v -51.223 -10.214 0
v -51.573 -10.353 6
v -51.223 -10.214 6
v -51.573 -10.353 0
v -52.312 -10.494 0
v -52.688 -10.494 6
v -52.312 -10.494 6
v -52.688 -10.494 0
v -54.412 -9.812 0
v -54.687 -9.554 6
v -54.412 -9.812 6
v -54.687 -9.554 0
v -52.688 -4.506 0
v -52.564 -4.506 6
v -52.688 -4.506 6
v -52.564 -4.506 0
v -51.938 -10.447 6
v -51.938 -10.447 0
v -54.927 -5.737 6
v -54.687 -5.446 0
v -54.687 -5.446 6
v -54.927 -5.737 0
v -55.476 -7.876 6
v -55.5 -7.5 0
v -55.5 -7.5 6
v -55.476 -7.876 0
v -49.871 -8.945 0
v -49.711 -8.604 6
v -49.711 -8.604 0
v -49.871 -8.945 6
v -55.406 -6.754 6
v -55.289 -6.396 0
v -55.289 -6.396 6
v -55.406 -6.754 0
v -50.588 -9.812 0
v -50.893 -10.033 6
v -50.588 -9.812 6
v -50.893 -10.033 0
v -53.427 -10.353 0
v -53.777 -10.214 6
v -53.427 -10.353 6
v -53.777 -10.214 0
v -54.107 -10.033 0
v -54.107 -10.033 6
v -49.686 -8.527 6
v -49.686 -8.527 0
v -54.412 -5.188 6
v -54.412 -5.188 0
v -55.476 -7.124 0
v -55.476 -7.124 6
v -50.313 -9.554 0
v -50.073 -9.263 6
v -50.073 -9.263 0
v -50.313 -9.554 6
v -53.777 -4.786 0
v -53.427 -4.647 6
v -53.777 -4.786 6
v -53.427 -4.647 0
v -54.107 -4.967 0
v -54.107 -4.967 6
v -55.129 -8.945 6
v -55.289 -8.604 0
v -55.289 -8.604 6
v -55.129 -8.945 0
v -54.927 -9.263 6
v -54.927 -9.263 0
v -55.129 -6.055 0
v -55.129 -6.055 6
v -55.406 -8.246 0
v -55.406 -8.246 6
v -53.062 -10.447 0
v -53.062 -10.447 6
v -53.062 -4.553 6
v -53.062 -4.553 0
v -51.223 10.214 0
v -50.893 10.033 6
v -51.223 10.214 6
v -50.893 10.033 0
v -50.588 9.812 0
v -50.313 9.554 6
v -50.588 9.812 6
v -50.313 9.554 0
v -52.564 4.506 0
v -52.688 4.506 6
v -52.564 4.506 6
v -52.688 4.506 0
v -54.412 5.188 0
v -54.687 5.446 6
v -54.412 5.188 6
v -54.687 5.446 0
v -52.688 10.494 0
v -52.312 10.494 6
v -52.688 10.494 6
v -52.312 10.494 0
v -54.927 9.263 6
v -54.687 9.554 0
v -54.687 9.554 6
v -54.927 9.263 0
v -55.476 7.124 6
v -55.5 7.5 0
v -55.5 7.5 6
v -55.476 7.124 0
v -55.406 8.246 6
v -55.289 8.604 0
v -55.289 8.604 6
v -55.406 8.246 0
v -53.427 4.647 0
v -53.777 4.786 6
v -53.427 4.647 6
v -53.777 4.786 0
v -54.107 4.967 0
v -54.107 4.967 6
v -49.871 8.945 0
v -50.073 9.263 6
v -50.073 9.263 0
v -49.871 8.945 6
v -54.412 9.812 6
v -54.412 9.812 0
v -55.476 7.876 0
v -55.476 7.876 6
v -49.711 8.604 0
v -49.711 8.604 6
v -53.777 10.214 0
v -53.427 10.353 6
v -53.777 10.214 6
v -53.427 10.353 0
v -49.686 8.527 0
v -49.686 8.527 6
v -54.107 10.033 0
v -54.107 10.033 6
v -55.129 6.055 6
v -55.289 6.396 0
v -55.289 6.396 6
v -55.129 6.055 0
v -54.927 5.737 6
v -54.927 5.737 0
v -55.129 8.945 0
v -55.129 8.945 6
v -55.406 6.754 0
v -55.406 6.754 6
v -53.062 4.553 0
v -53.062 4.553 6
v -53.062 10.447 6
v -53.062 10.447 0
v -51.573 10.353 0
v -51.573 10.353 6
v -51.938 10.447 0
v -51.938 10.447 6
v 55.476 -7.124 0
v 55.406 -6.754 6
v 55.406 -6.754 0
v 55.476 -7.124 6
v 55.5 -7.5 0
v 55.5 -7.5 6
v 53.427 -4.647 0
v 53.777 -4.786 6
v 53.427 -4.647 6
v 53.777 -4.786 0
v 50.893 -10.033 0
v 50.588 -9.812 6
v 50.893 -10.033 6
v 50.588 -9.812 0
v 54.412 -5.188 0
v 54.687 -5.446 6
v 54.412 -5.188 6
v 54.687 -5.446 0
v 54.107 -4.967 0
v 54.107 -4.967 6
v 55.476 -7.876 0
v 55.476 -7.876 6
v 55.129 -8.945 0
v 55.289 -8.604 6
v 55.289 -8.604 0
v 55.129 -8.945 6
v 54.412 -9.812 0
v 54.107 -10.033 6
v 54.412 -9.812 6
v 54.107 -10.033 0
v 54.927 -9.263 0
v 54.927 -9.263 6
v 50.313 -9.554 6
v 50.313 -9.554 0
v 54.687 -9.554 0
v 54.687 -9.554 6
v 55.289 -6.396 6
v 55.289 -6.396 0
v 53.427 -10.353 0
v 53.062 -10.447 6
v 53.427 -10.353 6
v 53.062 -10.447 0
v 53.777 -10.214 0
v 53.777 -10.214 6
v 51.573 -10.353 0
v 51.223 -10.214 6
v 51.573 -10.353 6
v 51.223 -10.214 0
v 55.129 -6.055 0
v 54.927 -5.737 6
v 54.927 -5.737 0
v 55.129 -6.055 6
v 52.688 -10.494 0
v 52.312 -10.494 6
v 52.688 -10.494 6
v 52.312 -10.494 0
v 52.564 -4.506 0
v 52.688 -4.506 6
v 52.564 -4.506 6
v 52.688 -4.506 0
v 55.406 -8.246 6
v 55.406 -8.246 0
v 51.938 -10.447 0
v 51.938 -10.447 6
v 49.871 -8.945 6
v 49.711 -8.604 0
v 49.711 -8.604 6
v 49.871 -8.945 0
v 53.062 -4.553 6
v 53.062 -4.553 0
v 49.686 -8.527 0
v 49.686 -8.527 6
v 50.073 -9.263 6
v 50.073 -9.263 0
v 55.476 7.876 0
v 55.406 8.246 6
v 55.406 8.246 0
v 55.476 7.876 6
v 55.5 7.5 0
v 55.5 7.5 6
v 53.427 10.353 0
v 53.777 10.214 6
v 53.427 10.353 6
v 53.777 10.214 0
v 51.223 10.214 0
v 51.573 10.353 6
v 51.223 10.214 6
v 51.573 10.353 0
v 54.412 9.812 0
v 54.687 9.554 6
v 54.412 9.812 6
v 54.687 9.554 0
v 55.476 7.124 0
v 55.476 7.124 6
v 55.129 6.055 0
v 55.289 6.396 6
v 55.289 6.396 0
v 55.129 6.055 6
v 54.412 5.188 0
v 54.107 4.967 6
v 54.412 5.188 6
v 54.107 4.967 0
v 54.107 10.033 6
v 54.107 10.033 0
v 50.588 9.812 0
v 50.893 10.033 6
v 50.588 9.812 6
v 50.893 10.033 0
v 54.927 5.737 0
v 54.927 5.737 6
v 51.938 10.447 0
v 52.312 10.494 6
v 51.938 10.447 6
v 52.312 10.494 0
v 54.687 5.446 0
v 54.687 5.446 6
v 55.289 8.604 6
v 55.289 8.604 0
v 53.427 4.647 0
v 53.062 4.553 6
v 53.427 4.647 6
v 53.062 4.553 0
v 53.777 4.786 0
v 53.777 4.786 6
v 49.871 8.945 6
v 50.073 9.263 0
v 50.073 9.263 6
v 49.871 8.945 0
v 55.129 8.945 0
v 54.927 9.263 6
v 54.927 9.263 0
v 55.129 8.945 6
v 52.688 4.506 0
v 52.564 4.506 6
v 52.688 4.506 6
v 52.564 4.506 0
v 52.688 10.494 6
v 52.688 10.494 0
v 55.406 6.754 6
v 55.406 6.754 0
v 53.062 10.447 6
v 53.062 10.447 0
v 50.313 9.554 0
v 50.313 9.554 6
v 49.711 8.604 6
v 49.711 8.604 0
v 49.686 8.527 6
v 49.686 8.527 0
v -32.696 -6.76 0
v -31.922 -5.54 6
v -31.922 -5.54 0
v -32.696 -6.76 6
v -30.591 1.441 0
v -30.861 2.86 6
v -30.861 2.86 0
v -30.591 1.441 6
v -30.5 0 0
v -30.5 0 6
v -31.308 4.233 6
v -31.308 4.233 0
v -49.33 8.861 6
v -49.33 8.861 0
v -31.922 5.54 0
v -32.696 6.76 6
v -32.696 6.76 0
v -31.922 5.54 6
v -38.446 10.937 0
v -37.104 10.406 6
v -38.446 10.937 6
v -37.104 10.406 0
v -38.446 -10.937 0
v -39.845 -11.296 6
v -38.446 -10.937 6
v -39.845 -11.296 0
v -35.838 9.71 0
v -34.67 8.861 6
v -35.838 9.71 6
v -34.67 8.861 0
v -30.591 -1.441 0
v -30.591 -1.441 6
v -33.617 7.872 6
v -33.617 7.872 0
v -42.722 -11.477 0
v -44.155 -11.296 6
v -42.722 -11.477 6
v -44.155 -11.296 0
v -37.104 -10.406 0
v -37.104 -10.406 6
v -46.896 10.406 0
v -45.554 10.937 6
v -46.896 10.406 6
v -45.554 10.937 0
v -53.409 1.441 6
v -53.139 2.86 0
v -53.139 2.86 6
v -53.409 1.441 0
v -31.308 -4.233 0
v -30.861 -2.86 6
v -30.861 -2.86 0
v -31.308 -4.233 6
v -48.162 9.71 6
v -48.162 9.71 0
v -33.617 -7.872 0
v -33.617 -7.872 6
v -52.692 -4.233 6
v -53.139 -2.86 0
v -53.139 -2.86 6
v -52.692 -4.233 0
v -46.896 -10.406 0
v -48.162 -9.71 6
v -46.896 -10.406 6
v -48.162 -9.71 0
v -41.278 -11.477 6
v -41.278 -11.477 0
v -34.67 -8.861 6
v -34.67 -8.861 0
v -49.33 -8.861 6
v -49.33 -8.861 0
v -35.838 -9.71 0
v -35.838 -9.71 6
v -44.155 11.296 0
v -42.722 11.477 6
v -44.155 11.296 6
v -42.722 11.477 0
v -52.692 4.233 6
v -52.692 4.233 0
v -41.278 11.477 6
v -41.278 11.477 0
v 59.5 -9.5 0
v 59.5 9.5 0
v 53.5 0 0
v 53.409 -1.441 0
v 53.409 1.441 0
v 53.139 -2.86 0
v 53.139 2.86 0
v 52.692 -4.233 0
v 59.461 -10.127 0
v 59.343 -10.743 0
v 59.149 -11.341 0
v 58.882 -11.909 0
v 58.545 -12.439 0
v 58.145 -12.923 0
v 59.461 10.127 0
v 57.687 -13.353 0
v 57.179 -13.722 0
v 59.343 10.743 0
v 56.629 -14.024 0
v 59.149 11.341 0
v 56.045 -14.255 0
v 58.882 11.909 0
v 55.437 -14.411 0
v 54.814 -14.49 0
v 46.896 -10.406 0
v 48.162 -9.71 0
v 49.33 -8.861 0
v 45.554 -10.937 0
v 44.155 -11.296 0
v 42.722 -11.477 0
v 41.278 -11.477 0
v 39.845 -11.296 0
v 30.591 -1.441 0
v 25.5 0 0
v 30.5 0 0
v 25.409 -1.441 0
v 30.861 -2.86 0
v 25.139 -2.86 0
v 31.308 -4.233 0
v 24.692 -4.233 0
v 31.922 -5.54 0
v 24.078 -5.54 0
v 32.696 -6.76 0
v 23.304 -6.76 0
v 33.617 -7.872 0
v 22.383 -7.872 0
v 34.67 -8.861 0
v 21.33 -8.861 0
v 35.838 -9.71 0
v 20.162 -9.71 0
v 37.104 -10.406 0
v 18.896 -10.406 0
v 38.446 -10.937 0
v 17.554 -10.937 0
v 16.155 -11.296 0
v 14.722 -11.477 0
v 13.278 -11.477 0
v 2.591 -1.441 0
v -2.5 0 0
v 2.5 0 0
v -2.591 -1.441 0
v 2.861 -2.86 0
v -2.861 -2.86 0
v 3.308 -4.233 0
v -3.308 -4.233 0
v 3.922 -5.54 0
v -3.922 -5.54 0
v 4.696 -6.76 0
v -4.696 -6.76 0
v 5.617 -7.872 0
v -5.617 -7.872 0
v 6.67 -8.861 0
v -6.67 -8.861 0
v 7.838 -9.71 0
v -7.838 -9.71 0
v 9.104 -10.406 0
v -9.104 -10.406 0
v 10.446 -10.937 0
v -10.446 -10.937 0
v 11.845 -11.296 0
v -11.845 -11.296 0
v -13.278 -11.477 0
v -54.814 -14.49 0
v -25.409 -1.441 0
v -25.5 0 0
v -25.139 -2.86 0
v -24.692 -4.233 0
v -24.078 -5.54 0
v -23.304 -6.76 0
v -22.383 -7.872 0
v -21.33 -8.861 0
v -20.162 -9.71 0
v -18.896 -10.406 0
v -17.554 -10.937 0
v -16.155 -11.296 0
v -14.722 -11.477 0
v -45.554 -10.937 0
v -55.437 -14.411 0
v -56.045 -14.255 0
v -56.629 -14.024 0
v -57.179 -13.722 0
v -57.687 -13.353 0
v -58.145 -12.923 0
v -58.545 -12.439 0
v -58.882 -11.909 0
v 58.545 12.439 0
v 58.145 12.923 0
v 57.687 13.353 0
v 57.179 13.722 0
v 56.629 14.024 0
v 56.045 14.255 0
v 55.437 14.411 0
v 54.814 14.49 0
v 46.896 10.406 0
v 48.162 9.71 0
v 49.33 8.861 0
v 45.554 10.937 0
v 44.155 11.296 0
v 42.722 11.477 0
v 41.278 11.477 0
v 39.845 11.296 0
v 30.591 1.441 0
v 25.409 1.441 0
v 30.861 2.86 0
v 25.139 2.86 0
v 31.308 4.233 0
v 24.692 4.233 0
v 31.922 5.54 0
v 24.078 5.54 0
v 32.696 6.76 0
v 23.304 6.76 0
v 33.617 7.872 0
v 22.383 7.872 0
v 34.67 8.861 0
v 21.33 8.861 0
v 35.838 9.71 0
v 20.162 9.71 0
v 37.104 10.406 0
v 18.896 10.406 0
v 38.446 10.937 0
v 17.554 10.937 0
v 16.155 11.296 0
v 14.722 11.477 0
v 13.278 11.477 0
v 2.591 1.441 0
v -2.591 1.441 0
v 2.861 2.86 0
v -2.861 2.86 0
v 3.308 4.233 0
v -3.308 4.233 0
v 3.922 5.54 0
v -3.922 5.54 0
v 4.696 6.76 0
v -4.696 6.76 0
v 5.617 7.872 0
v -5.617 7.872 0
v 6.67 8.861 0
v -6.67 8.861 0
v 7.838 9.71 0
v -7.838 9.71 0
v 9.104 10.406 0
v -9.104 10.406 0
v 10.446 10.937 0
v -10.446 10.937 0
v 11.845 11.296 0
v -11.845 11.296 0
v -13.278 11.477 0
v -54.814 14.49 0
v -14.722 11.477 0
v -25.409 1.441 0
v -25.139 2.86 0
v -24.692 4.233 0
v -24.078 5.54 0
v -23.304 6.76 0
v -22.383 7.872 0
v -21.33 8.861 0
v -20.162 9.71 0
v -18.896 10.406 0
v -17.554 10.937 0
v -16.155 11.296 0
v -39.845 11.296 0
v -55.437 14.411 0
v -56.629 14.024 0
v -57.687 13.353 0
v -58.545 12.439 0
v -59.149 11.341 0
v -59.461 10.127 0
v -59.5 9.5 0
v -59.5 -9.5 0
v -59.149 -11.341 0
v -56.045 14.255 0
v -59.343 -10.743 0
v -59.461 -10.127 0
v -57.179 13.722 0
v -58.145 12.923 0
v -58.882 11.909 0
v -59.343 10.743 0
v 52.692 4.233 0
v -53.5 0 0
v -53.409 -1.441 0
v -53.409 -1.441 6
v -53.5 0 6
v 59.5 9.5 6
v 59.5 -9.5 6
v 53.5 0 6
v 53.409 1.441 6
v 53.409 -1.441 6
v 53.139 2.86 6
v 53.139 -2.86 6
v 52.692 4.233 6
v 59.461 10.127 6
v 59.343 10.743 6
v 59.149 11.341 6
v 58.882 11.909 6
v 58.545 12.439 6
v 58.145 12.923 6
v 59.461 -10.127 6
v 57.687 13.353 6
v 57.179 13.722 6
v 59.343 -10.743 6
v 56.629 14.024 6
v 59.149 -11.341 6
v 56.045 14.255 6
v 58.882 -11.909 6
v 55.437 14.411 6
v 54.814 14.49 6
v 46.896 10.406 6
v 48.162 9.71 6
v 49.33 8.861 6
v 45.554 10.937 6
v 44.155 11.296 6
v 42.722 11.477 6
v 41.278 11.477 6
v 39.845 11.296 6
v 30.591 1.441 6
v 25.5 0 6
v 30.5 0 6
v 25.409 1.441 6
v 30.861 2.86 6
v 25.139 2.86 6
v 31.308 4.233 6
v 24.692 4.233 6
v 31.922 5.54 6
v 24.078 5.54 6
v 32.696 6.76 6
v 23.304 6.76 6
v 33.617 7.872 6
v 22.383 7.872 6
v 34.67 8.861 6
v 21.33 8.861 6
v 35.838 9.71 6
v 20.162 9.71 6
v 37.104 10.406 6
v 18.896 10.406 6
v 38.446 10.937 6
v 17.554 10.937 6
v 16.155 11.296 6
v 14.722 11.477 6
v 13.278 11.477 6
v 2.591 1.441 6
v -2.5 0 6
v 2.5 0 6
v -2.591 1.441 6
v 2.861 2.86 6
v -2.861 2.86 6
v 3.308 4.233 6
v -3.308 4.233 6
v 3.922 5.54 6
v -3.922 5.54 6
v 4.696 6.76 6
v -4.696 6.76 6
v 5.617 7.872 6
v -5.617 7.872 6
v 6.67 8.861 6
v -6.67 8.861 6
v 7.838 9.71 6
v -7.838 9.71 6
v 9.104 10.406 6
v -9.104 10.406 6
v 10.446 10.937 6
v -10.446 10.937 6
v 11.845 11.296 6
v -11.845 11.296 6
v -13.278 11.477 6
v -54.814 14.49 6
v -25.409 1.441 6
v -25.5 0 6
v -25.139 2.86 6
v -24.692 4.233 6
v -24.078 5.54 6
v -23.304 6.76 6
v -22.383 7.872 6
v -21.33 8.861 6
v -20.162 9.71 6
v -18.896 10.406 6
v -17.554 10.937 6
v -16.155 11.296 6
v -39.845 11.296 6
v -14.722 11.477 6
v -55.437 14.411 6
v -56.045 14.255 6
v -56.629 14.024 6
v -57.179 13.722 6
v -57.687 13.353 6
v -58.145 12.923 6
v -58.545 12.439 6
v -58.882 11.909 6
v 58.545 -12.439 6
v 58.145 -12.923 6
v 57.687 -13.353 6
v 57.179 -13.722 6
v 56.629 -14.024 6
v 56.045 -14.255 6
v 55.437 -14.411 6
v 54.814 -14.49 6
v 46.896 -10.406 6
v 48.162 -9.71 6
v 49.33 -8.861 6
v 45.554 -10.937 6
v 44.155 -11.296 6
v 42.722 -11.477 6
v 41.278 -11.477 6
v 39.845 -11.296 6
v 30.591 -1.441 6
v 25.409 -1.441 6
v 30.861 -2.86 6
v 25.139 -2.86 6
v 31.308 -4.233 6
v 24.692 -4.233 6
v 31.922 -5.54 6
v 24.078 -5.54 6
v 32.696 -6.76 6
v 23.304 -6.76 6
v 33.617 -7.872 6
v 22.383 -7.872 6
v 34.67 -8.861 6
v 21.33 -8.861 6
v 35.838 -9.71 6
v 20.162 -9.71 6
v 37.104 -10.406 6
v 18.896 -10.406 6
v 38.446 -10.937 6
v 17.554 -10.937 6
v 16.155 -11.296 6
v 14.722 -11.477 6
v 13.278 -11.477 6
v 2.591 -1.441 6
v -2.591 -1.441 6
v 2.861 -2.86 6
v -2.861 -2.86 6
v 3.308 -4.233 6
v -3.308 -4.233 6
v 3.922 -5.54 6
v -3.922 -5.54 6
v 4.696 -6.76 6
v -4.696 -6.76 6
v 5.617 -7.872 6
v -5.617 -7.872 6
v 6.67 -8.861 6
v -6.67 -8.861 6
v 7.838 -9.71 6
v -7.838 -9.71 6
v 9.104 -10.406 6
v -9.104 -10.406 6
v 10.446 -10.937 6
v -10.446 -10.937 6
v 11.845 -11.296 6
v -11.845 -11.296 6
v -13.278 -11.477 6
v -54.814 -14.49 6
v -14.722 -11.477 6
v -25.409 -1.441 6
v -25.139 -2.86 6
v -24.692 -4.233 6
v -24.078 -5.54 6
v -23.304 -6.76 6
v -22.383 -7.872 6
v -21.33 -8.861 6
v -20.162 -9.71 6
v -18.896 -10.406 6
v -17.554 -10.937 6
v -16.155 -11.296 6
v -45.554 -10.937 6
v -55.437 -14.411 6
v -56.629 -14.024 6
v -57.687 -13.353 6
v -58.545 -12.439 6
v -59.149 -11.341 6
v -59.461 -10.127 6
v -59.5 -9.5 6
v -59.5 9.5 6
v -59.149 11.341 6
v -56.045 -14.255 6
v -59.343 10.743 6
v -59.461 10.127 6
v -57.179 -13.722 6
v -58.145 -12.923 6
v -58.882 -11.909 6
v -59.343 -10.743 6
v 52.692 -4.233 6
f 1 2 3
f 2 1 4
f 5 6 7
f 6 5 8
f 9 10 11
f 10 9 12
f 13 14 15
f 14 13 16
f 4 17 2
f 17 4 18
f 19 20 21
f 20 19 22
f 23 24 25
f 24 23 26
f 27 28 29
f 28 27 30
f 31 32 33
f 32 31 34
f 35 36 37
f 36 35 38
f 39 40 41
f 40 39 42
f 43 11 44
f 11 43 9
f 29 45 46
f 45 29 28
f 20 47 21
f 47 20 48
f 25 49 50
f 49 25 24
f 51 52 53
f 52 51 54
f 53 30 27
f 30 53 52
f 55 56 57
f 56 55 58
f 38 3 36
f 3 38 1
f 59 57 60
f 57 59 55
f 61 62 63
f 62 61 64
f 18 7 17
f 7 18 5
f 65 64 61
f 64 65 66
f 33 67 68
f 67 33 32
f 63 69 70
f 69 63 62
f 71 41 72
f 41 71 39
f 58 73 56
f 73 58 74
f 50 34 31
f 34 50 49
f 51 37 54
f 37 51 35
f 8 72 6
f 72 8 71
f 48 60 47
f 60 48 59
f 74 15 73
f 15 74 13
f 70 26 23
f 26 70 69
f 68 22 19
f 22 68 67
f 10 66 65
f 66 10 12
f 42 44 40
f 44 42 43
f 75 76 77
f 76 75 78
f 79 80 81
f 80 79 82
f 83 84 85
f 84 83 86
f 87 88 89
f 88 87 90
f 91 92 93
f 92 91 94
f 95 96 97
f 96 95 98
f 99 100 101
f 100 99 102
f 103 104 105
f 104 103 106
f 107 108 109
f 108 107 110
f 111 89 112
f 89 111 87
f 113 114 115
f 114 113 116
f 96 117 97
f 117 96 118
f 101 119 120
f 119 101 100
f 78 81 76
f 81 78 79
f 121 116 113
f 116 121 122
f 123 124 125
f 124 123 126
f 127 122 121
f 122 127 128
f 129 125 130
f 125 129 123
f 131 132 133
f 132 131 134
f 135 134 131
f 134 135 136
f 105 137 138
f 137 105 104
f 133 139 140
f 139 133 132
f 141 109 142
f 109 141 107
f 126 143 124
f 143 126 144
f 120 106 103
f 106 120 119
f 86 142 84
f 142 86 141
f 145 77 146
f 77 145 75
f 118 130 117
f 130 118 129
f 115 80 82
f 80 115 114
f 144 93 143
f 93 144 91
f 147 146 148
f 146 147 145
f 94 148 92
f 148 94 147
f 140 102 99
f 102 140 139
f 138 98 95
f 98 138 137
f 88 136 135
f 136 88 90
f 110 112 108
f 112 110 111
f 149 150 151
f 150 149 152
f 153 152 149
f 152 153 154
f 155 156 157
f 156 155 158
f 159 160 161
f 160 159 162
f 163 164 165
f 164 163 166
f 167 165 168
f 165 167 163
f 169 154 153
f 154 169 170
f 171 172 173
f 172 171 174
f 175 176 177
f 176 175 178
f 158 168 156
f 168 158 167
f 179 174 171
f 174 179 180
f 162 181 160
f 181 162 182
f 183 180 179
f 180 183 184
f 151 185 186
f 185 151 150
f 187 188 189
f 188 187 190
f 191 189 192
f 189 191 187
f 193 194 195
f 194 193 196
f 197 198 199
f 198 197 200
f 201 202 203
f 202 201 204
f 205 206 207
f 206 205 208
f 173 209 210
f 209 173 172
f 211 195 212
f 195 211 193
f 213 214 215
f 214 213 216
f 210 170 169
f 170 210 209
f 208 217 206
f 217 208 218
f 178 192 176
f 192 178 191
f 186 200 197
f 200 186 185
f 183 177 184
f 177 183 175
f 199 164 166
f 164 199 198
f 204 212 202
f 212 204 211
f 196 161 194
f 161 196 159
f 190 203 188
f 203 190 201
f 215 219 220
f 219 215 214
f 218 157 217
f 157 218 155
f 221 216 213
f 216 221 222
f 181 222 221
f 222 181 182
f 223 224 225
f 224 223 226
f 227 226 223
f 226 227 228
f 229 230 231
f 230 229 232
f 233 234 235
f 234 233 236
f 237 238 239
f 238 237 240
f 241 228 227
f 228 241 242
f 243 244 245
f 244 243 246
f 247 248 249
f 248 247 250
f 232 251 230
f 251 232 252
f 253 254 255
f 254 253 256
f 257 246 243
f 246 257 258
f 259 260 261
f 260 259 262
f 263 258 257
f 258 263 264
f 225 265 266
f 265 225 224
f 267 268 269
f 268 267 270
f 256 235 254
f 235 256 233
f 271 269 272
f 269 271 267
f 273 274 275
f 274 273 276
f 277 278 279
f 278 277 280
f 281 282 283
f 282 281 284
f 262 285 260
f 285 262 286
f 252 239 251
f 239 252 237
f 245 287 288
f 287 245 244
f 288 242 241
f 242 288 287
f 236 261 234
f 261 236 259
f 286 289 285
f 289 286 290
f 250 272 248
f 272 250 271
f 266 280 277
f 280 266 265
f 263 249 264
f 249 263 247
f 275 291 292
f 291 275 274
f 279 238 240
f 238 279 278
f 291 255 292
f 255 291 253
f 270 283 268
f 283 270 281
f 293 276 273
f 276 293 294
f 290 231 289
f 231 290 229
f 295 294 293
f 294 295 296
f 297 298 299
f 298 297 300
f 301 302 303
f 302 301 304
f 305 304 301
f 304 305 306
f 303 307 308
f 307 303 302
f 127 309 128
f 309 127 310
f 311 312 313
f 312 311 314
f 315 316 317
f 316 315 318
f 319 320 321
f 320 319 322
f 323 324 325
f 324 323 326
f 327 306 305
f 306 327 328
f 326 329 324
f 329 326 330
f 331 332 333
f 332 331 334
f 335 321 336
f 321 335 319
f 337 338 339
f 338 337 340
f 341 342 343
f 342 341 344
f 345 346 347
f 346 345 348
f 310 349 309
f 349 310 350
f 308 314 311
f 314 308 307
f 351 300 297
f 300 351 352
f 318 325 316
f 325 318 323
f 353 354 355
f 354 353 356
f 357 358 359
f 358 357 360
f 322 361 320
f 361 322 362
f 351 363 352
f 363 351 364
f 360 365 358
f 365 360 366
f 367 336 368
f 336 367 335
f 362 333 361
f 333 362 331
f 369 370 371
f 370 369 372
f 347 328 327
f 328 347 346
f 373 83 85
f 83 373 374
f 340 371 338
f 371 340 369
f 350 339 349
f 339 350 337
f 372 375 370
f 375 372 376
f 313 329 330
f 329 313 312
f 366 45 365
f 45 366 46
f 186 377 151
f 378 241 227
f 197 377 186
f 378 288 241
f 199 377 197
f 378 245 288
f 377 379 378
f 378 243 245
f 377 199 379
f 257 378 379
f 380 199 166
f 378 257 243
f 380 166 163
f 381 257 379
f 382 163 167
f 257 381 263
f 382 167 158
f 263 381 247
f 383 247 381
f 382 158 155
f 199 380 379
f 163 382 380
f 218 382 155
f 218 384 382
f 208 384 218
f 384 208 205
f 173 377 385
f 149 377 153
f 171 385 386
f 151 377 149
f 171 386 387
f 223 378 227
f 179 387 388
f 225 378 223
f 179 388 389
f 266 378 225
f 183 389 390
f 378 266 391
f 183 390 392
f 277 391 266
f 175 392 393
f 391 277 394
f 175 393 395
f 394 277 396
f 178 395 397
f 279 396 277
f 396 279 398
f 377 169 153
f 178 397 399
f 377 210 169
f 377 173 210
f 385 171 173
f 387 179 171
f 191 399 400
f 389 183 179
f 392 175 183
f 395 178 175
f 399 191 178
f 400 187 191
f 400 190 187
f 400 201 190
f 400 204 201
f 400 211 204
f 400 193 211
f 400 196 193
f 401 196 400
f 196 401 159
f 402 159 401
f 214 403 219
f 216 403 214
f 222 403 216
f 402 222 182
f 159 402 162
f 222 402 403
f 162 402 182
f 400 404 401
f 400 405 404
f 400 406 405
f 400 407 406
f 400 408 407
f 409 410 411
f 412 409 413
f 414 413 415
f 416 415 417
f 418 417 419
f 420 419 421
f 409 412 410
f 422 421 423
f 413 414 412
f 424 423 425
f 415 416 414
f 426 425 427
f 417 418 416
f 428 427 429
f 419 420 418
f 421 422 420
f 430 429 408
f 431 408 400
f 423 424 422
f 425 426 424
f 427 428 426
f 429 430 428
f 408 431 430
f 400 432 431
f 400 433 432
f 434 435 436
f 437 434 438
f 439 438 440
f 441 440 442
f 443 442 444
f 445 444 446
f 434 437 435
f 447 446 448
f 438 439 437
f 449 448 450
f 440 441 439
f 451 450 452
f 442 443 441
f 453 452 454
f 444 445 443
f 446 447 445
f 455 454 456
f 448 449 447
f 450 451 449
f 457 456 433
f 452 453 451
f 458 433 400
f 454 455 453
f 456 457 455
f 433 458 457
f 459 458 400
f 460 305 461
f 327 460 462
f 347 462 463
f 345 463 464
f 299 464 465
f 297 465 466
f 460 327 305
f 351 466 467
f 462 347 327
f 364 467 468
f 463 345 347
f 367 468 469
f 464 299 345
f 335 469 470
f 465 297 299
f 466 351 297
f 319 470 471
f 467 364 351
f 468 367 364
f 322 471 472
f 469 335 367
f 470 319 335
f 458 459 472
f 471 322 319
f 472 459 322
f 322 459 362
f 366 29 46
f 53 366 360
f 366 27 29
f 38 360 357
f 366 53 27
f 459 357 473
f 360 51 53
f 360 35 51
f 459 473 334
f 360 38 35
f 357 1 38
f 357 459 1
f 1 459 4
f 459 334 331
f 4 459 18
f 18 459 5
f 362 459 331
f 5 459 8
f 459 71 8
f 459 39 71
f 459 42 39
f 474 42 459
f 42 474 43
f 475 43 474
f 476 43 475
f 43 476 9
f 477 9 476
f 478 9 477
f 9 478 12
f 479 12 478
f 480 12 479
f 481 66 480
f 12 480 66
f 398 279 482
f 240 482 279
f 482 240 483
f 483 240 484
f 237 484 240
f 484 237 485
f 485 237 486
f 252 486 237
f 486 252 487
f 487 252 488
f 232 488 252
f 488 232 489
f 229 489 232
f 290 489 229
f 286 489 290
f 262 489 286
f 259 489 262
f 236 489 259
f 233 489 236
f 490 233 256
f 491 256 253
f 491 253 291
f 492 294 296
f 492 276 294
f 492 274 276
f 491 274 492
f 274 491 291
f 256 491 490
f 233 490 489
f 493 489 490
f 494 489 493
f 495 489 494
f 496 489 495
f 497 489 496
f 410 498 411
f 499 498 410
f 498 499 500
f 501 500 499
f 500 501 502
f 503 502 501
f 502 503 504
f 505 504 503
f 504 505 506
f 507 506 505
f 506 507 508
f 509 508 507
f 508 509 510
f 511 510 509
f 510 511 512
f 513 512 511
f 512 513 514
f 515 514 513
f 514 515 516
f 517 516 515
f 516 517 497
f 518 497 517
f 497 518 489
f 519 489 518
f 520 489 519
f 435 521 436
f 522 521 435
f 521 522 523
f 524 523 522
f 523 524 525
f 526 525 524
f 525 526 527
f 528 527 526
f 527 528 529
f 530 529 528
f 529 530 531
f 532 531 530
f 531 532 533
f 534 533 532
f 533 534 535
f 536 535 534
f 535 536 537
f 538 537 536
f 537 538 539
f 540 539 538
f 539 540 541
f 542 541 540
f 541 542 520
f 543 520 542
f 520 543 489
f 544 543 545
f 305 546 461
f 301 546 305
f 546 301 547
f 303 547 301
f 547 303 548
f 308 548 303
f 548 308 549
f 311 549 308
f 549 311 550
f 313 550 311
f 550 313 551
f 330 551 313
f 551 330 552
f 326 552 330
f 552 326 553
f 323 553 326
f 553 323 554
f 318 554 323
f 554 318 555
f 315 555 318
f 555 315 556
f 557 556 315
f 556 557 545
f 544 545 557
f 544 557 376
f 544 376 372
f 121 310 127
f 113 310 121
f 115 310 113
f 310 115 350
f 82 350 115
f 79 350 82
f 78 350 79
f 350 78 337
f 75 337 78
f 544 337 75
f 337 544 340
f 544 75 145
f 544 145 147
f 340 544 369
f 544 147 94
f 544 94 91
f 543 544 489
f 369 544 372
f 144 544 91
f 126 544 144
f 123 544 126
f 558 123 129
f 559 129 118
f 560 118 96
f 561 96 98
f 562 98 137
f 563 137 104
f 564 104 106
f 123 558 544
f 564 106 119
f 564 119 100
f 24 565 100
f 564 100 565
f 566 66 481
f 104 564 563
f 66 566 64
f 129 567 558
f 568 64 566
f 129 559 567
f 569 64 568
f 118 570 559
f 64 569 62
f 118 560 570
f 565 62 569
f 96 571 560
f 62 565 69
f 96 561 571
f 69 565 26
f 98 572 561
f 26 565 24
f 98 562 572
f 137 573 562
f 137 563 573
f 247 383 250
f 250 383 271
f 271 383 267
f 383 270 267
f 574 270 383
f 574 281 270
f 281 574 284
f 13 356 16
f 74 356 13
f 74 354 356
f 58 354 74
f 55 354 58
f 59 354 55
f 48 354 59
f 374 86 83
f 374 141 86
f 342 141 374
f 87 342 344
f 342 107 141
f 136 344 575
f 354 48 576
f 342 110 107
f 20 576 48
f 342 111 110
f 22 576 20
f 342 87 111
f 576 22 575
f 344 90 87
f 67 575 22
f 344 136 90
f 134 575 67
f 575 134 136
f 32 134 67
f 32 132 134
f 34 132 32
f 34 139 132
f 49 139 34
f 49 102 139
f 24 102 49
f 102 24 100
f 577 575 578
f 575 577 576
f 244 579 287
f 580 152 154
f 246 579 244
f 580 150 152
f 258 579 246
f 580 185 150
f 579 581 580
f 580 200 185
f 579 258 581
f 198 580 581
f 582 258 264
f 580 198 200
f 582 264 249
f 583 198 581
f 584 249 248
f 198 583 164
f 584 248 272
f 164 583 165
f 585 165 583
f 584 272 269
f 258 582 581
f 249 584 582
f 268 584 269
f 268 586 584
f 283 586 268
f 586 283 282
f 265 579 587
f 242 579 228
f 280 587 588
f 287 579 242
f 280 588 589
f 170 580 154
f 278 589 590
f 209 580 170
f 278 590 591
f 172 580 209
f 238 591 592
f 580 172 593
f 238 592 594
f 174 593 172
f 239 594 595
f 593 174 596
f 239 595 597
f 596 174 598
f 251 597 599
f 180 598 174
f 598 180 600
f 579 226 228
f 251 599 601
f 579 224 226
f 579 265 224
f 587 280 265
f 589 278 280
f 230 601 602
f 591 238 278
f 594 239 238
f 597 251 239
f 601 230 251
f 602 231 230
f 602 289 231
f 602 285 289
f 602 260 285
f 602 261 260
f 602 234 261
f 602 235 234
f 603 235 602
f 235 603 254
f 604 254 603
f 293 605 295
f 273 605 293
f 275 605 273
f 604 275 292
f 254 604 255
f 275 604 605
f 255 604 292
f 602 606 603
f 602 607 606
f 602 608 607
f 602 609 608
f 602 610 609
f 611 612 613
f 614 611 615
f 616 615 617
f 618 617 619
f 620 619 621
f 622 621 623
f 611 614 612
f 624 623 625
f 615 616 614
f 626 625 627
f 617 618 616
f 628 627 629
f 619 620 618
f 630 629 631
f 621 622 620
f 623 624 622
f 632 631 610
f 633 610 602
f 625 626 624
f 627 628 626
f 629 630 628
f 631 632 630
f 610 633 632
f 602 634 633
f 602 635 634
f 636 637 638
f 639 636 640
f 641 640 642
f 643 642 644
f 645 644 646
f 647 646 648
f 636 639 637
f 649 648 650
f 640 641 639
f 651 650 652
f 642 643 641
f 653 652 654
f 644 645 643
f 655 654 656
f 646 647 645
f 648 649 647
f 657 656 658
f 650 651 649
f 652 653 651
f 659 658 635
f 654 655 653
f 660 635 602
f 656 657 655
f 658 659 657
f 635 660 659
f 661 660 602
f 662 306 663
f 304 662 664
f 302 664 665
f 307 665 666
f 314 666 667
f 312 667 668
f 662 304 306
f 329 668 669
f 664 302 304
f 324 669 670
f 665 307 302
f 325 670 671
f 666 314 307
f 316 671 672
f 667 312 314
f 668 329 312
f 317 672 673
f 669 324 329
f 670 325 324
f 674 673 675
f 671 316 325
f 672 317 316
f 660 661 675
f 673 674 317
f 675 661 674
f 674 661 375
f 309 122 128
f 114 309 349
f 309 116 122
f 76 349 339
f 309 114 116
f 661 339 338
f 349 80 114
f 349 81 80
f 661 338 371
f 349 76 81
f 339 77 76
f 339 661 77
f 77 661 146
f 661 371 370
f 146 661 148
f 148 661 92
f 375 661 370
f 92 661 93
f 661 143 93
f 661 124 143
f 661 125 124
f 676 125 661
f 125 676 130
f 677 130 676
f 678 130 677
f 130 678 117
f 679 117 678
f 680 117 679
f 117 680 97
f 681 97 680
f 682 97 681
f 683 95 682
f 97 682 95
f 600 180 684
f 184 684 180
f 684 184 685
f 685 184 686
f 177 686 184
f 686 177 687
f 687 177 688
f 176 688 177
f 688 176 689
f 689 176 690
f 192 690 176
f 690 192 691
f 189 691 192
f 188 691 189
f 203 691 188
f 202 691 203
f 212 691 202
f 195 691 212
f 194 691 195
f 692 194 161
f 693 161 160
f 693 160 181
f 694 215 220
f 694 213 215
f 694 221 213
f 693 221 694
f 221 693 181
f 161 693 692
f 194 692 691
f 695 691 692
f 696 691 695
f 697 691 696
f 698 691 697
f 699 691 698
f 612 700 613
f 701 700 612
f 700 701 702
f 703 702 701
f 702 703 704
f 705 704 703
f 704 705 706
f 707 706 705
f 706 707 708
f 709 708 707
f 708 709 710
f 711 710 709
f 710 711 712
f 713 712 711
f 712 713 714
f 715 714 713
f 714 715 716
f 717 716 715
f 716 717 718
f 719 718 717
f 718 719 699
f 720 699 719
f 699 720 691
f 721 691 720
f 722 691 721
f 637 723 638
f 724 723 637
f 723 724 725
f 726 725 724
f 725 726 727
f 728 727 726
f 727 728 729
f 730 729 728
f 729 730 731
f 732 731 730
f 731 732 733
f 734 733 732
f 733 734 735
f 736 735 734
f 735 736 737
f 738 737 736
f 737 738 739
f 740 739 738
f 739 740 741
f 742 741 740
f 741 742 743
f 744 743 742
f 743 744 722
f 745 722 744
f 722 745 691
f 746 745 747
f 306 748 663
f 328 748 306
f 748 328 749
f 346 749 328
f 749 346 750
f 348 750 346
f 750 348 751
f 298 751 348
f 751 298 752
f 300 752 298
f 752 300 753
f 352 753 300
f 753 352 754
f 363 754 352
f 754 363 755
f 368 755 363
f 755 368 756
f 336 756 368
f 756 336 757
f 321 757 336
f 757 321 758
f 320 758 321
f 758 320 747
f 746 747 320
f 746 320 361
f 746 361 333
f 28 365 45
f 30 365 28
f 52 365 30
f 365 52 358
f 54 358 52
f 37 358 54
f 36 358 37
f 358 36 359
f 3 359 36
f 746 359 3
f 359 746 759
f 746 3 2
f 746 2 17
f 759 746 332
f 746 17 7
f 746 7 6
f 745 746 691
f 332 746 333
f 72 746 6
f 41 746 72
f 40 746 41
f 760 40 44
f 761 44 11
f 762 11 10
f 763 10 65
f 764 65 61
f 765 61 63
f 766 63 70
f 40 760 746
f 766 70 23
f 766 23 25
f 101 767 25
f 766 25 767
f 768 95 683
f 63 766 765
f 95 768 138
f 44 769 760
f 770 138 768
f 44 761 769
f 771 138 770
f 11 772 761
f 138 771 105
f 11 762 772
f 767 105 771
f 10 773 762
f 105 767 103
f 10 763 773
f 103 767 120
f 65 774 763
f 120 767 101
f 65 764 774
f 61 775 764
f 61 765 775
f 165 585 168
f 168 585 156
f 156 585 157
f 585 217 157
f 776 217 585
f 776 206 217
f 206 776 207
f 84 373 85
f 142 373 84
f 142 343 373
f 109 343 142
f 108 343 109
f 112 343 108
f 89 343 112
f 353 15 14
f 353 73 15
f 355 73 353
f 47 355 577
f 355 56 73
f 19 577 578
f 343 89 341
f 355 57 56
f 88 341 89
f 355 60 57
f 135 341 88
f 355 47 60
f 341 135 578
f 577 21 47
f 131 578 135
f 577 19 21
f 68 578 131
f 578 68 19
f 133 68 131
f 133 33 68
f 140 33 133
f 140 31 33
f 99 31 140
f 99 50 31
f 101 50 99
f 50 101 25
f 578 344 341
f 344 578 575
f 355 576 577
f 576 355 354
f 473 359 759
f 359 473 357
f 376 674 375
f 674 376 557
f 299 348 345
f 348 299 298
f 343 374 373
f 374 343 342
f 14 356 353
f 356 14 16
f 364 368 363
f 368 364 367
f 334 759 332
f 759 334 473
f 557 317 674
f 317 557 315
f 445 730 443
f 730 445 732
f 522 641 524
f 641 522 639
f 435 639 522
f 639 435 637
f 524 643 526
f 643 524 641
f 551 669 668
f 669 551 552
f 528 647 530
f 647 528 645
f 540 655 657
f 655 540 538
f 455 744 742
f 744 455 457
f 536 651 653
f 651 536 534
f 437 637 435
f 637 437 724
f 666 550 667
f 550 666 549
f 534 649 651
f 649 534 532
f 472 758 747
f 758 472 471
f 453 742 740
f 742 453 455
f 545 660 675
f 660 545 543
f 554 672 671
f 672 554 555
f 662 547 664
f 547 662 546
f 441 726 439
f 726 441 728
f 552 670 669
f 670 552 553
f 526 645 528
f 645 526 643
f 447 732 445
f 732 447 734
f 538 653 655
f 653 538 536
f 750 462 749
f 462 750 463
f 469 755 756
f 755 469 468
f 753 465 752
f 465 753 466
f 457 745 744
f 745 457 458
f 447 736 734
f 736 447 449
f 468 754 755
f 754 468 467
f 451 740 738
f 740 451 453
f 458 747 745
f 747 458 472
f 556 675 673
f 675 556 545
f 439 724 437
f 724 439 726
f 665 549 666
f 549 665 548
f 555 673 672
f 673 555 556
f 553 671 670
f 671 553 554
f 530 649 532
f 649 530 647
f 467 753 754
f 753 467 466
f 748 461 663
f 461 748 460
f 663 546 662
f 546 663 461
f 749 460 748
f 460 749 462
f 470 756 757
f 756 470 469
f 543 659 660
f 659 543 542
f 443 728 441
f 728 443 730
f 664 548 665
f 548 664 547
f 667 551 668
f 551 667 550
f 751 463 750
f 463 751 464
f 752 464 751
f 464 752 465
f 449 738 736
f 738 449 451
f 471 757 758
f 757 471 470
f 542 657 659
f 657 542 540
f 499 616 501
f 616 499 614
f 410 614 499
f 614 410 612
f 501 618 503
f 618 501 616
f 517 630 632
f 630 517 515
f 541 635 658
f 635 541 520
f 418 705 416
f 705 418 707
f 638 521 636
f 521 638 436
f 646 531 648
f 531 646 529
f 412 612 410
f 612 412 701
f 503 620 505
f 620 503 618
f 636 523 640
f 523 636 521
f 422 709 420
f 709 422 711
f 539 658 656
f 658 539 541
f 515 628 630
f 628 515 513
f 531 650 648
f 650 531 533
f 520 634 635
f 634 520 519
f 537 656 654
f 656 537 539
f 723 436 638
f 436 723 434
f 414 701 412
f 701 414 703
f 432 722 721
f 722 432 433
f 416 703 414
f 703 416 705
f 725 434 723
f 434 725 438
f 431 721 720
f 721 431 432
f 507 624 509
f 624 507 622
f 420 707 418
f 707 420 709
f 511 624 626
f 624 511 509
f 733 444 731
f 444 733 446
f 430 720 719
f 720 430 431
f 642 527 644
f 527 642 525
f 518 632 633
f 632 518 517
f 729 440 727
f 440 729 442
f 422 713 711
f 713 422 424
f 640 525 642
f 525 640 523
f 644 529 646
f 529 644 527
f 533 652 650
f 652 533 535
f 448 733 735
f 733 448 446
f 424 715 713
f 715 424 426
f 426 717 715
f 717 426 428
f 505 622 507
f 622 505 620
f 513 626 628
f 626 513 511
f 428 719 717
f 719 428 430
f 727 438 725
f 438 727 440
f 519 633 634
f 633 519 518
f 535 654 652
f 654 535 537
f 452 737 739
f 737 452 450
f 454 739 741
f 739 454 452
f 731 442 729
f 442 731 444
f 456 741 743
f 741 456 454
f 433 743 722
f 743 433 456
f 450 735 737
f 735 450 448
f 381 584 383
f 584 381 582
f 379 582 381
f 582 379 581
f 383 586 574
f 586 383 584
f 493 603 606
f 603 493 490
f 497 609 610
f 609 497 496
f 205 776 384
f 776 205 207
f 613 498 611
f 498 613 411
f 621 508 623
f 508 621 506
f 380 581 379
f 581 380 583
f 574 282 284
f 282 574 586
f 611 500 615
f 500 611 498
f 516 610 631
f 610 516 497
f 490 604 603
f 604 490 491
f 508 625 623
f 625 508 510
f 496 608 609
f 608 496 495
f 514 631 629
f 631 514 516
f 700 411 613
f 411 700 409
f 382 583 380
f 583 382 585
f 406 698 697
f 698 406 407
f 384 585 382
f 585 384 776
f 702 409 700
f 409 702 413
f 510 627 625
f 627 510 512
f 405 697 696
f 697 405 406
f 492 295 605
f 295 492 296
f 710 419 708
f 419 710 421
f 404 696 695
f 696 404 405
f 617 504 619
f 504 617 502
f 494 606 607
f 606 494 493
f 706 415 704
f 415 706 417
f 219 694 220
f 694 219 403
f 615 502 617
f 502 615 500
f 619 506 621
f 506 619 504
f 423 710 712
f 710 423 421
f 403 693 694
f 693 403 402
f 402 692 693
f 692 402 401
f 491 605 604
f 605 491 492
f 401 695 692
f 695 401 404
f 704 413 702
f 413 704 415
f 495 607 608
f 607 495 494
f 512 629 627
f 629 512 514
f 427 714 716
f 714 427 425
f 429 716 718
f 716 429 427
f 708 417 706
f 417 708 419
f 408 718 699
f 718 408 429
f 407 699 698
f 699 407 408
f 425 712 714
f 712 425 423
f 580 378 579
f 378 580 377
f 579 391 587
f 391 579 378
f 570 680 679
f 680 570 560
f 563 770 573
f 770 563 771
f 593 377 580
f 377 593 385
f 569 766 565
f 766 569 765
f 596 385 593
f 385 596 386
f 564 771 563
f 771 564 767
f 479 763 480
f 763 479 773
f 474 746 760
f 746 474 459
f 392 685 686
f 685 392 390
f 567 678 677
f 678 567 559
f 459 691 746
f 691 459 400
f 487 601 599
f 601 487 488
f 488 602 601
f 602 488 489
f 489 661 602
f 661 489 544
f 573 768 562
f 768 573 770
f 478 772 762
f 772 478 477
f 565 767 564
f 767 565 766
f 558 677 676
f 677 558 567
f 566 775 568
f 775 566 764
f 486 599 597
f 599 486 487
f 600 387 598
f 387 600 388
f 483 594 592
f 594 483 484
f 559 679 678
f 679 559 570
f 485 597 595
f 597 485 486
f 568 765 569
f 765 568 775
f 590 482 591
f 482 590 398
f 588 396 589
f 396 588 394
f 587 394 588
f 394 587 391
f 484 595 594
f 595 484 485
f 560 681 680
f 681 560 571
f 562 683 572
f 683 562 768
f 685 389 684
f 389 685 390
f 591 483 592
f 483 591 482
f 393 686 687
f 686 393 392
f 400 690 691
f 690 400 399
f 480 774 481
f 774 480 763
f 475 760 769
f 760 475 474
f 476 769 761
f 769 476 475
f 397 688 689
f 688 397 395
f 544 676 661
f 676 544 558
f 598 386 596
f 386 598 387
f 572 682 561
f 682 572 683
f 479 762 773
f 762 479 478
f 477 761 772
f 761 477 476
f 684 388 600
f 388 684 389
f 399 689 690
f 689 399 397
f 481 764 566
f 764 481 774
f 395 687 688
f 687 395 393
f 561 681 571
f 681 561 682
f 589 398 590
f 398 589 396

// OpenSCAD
$fn = 50;


difference() {
	union() {
		hull() {
			translate(v = [-54.5000000000, 9.5000000000, 0]) {
				cylinder(h = 6, r = 5);
			}
			translate(v = [54.5000000000, 9.5000000000, 0]) {
				cylinder(h = 6, r = 5);
			}
			translate(v = [-54.5000000000, -9.5000000000, 0]) {
				cylinder(h = 6, r = 5);
			}
			translate(v = [54.5000000000, -9.5000000000, 0]) {
				cylinder(h = 6, r = 5);
			}
		}
	}
	union() {
		#translate(v = [-52.5000000000, -7.5000000000, -100.0000000000]) {
			cylinder(h = 200, r = 3.0000000000);
		}
		#translate(v = [-52.5000000000, 7.5000000000, -100.0000000000]) {
			cylinder(h = 200, r = 3.0000000000);
		}
		#translate(v = [52.5000000000, -7.5000000000, -100.0000000000]) {
			cylinder(h = 200, r = 3.0000000000);
		}
		#translate(v = [52.5000000000, 7.5000000000, -100.0000000000]) {
			cylinder(h = 200, r = 3.0000000000);
		}
		#translate(v = [-42.0000000000, 0, 0]) {
			cylinder(h = 6, r = 11.5000000000);
		}
		#translate(v = [-14.0000000000, 0, 0]) {
			cylinder(h = 6, r = 11.5000000000);
		}
		#translate(v = [14.0000000000, 0, 0]) {
			cylinder(h = 6, r = 11.5000000000);
		}
		#translate(v = [42.0000000000, 0, 0]) {
			cylinder(h = 6, r = 11.5000000000);
		}
	}
}
